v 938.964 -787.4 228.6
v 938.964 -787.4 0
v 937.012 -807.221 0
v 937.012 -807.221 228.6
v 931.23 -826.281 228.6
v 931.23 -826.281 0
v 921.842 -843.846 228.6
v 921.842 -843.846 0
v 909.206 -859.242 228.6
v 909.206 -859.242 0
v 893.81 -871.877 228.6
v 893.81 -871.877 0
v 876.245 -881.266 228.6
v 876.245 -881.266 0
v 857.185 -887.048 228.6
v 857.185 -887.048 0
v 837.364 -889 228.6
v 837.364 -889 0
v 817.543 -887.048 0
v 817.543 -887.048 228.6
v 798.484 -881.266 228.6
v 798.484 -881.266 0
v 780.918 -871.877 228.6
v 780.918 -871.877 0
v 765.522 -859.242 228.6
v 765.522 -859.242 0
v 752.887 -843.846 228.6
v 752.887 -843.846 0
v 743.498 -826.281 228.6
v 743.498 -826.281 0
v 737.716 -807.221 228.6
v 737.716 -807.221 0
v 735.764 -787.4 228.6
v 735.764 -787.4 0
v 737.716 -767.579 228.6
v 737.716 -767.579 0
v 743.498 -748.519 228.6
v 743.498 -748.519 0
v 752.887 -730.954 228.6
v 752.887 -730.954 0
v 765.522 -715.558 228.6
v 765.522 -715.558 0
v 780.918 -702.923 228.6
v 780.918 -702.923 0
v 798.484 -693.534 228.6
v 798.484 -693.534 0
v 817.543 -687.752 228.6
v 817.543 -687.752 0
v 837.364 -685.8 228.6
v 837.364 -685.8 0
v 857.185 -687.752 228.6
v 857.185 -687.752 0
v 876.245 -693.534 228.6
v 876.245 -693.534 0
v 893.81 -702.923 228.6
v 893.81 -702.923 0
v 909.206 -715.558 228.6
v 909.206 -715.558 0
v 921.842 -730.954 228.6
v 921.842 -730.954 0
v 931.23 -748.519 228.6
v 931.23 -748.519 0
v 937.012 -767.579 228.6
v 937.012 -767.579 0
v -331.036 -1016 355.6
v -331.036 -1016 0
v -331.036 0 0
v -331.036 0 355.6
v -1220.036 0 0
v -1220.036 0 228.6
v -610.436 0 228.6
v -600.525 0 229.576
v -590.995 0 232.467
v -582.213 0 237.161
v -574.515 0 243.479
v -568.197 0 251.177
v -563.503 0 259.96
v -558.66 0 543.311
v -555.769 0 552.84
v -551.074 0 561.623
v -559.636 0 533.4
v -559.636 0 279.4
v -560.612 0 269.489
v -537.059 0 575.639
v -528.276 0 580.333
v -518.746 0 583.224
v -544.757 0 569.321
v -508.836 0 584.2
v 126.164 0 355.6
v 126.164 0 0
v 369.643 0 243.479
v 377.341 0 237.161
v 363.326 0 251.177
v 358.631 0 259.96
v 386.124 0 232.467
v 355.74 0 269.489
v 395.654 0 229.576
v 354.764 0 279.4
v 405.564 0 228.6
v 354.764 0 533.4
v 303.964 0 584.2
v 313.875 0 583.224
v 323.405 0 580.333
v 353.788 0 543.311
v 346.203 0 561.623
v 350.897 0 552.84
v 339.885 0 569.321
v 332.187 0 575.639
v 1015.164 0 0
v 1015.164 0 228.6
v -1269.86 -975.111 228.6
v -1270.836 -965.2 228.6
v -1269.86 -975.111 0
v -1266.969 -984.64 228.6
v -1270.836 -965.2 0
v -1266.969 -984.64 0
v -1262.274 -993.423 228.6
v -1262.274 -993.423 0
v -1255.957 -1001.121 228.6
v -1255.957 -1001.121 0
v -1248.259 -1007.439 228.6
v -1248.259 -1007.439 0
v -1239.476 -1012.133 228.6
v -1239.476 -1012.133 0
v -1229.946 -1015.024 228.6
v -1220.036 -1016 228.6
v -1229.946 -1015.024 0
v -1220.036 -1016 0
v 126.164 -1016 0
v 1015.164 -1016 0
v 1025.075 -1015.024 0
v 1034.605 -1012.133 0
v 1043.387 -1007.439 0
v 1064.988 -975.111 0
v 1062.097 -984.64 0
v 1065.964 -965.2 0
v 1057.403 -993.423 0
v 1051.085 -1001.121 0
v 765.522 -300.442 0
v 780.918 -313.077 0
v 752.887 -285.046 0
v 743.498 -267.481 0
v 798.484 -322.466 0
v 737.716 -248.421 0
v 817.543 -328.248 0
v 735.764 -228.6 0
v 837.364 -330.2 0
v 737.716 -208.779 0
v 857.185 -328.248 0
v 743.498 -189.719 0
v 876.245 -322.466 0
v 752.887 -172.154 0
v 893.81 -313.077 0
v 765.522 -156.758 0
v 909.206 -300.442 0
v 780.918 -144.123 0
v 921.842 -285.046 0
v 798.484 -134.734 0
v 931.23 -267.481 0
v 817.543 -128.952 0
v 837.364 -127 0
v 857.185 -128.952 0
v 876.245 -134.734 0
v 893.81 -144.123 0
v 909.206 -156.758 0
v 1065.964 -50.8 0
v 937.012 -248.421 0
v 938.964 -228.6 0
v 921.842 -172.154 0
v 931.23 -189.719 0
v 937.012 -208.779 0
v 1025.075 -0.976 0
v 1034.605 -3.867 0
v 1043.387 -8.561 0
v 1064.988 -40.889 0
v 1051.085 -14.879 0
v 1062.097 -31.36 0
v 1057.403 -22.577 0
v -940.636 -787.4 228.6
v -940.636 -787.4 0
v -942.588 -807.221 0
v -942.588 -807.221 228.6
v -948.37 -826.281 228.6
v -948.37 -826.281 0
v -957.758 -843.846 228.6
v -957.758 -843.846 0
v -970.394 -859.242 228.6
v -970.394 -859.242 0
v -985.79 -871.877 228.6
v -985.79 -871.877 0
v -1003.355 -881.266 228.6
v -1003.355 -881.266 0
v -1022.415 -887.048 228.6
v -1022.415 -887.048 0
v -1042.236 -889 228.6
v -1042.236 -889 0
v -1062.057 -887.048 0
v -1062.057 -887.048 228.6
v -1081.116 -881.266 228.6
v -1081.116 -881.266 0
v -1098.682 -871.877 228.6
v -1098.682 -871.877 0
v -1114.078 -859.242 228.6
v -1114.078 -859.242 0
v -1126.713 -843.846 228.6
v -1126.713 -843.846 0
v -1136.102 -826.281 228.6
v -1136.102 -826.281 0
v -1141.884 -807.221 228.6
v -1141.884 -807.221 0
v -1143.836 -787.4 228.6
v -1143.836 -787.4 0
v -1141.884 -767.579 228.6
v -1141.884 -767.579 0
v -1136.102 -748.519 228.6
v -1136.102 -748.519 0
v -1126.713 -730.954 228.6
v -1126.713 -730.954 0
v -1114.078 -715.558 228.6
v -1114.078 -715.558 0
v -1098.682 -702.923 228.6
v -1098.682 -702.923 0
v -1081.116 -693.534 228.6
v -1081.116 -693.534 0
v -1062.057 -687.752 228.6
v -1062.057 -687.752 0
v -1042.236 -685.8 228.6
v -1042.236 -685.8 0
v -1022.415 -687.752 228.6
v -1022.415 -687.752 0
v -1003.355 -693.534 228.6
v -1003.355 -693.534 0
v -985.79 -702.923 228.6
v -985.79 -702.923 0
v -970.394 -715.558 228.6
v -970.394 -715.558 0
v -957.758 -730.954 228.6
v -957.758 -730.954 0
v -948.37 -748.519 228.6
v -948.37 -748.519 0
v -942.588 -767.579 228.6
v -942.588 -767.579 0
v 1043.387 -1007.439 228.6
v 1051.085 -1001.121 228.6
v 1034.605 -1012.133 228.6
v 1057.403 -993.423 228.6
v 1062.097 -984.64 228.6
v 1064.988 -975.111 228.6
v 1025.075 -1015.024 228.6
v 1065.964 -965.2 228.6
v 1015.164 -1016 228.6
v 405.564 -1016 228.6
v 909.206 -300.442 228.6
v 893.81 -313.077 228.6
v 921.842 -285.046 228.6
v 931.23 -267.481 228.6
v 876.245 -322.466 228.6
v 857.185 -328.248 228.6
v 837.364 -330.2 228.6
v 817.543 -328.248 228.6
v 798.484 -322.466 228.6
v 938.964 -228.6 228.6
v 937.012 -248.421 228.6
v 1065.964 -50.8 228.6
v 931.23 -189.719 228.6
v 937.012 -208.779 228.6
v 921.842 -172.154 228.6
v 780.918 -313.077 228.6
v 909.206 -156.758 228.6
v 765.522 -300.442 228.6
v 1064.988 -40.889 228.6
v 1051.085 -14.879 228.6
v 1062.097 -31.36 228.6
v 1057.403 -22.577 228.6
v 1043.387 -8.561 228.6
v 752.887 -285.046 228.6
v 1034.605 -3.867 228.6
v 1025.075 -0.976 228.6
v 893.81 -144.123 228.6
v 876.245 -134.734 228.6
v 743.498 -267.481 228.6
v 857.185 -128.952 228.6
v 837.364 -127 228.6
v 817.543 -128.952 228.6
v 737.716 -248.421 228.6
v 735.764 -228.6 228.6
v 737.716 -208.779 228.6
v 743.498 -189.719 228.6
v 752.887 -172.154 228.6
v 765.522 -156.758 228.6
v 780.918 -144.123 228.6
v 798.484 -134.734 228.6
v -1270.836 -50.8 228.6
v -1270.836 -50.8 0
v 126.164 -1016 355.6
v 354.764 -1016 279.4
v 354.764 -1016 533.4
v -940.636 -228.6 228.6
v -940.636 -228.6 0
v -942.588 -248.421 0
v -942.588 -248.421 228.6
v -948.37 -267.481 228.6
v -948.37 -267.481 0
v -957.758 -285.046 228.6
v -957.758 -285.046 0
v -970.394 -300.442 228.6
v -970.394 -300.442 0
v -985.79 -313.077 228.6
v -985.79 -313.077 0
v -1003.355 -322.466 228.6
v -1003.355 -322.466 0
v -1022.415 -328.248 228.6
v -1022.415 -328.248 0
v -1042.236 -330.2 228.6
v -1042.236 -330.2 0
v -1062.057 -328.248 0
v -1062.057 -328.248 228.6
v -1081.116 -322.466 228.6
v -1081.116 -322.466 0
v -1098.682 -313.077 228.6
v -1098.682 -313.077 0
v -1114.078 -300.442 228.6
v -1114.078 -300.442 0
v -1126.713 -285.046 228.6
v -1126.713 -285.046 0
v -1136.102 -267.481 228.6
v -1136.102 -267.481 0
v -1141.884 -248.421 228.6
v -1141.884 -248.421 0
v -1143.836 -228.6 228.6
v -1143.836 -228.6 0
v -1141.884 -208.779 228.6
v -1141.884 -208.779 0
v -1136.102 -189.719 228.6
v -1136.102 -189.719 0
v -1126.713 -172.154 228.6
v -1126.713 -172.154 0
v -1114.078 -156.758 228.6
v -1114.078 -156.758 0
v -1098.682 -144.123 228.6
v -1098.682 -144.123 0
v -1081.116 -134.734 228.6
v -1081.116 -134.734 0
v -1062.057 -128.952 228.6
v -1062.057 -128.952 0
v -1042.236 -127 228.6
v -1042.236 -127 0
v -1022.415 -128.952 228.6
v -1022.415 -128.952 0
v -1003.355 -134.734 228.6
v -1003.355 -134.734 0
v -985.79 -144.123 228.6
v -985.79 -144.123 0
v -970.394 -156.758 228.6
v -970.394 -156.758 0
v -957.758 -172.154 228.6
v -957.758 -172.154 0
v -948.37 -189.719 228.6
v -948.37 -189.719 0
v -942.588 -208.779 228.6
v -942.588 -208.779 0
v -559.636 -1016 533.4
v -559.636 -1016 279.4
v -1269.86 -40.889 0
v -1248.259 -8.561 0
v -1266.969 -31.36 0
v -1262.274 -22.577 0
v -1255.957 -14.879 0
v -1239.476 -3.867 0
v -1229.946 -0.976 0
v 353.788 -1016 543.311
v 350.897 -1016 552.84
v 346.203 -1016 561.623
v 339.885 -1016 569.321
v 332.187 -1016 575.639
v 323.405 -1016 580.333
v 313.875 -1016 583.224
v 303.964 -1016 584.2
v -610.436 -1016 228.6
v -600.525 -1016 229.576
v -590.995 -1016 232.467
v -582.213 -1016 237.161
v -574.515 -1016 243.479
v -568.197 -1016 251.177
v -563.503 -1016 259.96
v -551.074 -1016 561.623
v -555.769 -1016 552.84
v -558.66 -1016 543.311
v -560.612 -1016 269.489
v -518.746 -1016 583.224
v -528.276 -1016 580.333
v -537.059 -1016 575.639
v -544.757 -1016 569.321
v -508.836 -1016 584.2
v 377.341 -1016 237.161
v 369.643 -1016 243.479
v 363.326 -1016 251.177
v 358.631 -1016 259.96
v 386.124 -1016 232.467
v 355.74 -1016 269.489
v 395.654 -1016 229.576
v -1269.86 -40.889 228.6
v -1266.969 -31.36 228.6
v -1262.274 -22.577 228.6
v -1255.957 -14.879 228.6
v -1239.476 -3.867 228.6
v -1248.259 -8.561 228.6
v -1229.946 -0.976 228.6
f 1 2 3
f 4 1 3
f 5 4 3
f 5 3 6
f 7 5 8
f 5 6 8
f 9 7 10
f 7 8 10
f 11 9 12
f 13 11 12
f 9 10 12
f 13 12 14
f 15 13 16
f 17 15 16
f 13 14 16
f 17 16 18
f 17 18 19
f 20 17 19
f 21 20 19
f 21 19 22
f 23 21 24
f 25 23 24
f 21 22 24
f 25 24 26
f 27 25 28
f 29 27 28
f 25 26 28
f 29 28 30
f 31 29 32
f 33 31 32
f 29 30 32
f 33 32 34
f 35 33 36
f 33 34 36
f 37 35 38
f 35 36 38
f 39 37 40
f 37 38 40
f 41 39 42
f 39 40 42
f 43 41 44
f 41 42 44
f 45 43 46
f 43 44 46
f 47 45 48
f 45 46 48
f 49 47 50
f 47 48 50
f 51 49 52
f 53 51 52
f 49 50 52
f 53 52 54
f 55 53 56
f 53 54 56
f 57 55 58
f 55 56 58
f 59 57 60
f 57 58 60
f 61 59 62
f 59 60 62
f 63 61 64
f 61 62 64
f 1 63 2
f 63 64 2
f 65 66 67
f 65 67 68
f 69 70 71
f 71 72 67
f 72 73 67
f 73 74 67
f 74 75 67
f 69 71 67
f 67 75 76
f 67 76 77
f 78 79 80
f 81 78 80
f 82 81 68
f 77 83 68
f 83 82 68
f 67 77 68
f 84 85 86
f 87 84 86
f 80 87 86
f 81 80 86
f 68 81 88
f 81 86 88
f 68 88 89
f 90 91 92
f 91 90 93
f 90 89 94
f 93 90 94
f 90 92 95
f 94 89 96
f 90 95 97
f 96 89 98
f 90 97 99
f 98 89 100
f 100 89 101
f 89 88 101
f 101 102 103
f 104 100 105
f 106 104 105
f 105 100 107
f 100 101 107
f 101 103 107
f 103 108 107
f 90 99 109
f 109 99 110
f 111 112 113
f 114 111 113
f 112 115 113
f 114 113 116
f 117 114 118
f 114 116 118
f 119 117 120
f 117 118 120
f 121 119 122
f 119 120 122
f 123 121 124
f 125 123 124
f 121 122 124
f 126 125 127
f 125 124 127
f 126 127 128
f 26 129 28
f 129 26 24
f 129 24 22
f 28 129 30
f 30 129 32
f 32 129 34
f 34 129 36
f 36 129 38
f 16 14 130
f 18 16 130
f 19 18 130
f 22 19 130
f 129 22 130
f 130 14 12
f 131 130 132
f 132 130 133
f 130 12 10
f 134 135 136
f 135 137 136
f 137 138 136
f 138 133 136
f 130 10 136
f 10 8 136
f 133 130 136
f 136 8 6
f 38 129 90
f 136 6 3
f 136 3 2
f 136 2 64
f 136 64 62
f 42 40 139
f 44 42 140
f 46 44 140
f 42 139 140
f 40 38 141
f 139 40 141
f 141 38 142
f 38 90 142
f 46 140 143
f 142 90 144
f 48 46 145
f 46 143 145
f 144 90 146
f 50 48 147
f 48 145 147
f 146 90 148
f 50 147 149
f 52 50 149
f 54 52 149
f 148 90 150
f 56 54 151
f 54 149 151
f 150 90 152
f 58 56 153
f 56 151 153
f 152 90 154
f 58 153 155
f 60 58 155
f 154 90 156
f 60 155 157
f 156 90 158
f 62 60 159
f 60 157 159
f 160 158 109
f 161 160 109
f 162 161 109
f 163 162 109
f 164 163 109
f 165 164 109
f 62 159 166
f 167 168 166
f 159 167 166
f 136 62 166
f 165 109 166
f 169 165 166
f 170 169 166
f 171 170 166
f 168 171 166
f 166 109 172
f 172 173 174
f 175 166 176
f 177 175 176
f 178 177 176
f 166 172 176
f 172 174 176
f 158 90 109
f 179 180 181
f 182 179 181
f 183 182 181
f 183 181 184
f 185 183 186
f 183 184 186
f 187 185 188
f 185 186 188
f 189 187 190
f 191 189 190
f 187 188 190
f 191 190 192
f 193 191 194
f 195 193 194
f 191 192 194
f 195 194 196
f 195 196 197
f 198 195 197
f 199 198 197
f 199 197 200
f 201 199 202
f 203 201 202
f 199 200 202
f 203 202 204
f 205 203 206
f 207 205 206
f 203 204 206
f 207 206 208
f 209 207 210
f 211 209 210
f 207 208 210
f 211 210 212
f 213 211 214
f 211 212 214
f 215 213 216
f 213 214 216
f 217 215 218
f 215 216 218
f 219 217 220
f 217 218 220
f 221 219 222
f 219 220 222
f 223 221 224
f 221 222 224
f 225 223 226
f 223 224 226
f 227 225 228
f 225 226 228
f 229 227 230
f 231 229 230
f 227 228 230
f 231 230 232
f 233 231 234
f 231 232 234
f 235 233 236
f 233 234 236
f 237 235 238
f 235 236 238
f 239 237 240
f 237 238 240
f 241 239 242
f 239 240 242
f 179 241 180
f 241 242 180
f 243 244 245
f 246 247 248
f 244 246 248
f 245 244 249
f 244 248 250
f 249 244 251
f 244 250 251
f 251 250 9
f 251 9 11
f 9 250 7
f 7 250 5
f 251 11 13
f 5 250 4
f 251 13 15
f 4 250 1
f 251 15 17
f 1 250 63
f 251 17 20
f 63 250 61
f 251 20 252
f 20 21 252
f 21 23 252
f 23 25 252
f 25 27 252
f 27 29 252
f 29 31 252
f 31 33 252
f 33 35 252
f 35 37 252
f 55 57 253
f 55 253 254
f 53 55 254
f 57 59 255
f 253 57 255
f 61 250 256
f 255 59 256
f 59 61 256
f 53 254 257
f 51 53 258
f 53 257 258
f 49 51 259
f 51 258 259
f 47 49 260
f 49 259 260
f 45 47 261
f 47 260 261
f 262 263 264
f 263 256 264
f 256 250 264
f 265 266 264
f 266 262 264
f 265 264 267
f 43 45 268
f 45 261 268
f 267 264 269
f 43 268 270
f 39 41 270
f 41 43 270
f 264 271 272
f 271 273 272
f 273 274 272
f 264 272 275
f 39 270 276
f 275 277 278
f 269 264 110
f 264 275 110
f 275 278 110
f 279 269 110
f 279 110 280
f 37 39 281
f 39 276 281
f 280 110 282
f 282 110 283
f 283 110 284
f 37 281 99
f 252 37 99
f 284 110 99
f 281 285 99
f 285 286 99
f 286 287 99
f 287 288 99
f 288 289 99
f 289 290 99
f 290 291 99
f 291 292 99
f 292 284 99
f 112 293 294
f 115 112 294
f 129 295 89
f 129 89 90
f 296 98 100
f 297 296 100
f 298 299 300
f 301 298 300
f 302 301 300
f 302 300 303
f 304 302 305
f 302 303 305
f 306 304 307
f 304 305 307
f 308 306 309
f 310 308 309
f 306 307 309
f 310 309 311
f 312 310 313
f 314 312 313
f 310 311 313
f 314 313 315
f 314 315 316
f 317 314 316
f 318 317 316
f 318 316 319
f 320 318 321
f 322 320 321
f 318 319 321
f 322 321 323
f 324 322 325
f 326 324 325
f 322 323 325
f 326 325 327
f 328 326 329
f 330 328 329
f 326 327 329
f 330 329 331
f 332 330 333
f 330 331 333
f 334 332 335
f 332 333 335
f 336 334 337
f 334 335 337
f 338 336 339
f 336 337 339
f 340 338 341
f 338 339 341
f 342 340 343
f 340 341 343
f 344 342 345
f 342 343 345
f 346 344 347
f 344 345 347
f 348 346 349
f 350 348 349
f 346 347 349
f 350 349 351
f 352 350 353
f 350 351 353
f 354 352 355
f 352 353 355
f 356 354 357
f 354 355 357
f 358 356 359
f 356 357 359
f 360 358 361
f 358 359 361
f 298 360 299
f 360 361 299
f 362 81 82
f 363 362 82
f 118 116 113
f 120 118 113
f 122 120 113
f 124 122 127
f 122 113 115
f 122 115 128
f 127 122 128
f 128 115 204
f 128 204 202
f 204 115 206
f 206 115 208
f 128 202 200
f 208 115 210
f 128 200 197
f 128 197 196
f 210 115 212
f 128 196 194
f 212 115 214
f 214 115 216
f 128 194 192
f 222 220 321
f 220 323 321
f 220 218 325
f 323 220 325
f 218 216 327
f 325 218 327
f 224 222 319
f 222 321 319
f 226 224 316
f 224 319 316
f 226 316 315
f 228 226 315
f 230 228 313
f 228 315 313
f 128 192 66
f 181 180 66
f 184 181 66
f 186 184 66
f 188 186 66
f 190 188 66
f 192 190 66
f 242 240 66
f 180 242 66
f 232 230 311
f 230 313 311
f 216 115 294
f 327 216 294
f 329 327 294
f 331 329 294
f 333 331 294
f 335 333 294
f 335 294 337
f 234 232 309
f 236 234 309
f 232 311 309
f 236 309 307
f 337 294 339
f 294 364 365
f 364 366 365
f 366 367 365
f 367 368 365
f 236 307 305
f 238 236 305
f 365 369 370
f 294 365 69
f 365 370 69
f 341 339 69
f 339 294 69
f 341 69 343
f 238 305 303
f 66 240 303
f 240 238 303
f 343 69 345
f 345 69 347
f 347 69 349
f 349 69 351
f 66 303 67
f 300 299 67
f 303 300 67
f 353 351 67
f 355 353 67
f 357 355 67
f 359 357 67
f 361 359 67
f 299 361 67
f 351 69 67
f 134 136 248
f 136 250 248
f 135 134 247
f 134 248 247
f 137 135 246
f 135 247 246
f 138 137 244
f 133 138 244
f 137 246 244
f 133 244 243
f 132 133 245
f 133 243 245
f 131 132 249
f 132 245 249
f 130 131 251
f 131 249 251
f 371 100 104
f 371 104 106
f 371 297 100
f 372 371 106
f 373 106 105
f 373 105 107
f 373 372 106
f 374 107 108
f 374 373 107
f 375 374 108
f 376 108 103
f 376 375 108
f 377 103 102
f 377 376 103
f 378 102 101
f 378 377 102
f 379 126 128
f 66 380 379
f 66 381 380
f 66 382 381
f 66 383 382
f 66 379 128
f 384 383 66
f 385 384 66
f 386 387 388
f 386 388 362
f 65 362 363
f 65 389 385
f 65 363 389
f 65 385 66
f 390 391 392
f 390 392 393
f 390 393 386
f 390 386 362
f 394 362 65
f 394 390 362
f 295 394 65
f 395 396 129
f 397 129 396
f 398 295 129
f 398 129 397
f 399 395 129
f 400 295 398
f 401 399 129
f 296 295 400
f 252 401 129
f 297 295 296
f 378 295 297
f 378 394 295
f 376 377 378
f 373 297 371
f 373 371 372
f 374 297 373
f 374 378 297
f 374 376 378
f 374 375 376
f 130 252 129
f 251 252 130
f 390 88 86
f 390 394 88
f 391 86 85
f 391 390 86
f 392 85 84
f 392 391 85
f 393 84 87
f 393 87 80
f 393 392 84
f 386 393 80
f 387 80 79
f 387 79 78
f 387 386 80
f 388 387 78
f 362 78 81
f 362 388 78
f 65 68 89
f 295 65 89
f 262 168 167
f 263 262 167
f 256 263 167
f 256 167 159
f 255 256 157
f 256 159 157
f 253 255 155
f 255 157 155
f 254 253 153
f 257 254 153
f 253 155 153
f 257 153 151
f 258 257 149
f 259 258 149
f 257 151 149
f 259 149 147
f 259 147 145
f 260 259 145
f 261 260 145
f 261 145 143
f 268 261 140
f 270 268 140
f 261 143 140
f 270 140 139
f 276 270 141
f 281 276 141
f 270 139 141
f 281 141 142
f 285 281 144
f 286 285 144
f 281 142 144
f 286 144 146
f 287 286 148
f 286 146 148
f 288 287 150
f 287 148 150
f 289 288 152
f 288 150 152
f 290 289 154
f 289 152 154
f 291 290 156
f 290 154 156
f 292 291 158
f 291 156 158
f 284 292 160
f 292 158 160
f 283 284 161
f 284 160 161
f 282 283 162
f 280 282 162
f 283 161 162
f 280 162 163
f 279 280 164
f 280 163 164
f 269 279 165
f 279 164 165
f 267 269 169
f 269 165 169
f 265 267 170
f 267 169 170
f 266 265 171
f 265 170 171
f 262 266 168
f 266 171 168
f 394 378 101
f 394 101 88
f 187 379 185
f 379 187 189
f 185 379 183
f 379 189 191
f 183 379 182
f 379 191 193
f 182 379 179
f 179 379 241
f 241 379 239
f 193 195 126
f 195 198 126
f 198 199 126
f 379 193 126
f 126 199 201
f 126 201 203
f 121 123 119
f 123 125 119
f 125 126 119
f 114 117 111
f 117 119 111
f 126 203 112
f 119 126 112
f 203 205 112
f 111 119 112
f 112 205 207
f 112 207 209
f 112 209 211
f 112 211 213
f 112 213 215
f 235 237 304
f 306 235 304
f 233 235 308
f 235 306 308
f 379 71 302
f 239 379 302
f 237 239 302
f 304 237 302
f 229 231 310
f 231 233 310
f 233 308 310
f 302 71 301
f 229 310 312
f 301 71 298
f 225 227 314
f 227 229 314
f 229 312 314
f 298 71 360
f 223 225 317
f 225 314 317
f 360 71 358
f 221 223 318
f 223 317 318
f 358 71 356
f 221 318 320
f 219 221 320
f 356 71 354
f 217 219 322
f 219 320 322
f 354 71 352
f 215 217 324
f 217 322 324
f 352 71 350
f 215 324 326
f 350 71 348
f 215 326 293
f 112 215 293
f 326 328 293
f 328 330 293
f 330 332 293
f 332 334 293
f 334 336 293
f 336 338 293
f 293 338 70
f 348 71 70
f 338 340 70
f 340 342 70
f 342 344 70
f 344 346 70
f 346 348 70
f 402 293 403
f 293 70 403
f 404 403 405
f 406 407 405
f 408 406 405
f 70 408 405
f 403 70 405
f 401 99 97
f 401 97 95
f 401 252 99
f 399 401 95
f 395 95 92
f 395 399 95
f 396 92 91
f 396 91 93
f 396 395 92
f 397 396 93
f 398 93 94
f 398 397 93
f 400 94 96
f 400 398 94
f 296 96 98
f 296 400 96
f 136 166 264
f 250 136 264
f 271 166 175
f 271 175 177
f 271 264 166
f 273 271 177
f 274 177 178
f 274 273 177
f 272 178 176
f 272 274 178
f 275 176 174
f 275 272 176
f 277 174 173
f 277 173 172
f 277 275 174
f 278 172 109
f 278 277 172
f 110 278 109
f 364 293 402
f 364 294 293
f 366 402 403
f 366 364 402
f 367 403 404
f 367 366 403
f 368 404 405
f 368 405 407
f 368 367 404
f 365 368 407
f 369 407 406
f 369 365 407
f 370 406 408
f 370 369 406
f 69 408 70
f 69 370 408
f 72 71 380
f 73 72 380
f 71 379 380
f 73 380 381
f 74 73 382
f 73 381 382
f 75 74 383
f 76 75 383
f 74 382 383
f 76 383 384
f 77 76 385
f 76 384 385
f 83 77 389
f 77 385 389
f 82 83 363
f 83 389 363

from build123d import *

# Parameters (mm, degrees)
F1_DEPTH = 1016
F2_R     = 50.8
F3_R     = 50.8
F4_R     = 101.6
F5_DEPTH = 228.6


# Not quite as in the source:
# - a feature names something its author has since deleted; it is built from what else it names


with BuildPart() as f1:
    # F0 (on Front) → F1 (new body)
    with BuildSketch(Plane.XZ):
        Polygon((-1270.8357659235, 228.6), (-1270.8357659235, 0), (-331.0357659235, 0), (-331.0357659235, 355.6), (126.1642340765, 355.6), (126.1642340765, 0), (1065.9642340765, 0), (1065.9642340765, 228.6), (354.7642340765, 228.6), (354.7642340765, 584.2), (-559.6357659235, 584.2), (-559.6357659235, 228.6), align=None)
    extrude(amount=F1_DEPTH)

    # F2
    f2_edges = [f1.edges().sort_by_distance(p)[0] for p in [
        (-559.635766, -508, 584.2),
        (354.764234, -508, 584.2),
        (-1270.835766, -1016, 114.3),
        (1065.964234, -1016, 114.3),
        (1065.964234, 0, 114.3),
        (-1270.835766, 0, 114.3),
    ]]
    fillet(f2_edges, radius=F2_R)

    # F3
    f3_edges = [f1.edges().sort_by_distance(p)[0] for p in [
        (354.764234, -508, 228.6),
        (-559.635766, -508, 228.6),
    ]]
    fillet(f3_edges, radius=F3_R)

    # F4 (on face) → F5 (cut)
    with BuildSketch(Plane(origin=(0, 0, 0), x_dir=(1, 0, 0), z_dir=(0, 0, -1))):
        with Locations((837.3642340765, 228.6)):
            Circle(F4_R)
        with Locations((837.3642340765, 787.4)):
            Circle(F4_R)
        with Locations((-1042.2357659235, 228.6)):
            Circle(F4_R)
        with Locations((-1042.2357659235, 787.4)):
            Circle(F4_R)
    extrude(amount=-F5_DEPTH, mode=Mode.SUBTRACT)


solid = f1.part
